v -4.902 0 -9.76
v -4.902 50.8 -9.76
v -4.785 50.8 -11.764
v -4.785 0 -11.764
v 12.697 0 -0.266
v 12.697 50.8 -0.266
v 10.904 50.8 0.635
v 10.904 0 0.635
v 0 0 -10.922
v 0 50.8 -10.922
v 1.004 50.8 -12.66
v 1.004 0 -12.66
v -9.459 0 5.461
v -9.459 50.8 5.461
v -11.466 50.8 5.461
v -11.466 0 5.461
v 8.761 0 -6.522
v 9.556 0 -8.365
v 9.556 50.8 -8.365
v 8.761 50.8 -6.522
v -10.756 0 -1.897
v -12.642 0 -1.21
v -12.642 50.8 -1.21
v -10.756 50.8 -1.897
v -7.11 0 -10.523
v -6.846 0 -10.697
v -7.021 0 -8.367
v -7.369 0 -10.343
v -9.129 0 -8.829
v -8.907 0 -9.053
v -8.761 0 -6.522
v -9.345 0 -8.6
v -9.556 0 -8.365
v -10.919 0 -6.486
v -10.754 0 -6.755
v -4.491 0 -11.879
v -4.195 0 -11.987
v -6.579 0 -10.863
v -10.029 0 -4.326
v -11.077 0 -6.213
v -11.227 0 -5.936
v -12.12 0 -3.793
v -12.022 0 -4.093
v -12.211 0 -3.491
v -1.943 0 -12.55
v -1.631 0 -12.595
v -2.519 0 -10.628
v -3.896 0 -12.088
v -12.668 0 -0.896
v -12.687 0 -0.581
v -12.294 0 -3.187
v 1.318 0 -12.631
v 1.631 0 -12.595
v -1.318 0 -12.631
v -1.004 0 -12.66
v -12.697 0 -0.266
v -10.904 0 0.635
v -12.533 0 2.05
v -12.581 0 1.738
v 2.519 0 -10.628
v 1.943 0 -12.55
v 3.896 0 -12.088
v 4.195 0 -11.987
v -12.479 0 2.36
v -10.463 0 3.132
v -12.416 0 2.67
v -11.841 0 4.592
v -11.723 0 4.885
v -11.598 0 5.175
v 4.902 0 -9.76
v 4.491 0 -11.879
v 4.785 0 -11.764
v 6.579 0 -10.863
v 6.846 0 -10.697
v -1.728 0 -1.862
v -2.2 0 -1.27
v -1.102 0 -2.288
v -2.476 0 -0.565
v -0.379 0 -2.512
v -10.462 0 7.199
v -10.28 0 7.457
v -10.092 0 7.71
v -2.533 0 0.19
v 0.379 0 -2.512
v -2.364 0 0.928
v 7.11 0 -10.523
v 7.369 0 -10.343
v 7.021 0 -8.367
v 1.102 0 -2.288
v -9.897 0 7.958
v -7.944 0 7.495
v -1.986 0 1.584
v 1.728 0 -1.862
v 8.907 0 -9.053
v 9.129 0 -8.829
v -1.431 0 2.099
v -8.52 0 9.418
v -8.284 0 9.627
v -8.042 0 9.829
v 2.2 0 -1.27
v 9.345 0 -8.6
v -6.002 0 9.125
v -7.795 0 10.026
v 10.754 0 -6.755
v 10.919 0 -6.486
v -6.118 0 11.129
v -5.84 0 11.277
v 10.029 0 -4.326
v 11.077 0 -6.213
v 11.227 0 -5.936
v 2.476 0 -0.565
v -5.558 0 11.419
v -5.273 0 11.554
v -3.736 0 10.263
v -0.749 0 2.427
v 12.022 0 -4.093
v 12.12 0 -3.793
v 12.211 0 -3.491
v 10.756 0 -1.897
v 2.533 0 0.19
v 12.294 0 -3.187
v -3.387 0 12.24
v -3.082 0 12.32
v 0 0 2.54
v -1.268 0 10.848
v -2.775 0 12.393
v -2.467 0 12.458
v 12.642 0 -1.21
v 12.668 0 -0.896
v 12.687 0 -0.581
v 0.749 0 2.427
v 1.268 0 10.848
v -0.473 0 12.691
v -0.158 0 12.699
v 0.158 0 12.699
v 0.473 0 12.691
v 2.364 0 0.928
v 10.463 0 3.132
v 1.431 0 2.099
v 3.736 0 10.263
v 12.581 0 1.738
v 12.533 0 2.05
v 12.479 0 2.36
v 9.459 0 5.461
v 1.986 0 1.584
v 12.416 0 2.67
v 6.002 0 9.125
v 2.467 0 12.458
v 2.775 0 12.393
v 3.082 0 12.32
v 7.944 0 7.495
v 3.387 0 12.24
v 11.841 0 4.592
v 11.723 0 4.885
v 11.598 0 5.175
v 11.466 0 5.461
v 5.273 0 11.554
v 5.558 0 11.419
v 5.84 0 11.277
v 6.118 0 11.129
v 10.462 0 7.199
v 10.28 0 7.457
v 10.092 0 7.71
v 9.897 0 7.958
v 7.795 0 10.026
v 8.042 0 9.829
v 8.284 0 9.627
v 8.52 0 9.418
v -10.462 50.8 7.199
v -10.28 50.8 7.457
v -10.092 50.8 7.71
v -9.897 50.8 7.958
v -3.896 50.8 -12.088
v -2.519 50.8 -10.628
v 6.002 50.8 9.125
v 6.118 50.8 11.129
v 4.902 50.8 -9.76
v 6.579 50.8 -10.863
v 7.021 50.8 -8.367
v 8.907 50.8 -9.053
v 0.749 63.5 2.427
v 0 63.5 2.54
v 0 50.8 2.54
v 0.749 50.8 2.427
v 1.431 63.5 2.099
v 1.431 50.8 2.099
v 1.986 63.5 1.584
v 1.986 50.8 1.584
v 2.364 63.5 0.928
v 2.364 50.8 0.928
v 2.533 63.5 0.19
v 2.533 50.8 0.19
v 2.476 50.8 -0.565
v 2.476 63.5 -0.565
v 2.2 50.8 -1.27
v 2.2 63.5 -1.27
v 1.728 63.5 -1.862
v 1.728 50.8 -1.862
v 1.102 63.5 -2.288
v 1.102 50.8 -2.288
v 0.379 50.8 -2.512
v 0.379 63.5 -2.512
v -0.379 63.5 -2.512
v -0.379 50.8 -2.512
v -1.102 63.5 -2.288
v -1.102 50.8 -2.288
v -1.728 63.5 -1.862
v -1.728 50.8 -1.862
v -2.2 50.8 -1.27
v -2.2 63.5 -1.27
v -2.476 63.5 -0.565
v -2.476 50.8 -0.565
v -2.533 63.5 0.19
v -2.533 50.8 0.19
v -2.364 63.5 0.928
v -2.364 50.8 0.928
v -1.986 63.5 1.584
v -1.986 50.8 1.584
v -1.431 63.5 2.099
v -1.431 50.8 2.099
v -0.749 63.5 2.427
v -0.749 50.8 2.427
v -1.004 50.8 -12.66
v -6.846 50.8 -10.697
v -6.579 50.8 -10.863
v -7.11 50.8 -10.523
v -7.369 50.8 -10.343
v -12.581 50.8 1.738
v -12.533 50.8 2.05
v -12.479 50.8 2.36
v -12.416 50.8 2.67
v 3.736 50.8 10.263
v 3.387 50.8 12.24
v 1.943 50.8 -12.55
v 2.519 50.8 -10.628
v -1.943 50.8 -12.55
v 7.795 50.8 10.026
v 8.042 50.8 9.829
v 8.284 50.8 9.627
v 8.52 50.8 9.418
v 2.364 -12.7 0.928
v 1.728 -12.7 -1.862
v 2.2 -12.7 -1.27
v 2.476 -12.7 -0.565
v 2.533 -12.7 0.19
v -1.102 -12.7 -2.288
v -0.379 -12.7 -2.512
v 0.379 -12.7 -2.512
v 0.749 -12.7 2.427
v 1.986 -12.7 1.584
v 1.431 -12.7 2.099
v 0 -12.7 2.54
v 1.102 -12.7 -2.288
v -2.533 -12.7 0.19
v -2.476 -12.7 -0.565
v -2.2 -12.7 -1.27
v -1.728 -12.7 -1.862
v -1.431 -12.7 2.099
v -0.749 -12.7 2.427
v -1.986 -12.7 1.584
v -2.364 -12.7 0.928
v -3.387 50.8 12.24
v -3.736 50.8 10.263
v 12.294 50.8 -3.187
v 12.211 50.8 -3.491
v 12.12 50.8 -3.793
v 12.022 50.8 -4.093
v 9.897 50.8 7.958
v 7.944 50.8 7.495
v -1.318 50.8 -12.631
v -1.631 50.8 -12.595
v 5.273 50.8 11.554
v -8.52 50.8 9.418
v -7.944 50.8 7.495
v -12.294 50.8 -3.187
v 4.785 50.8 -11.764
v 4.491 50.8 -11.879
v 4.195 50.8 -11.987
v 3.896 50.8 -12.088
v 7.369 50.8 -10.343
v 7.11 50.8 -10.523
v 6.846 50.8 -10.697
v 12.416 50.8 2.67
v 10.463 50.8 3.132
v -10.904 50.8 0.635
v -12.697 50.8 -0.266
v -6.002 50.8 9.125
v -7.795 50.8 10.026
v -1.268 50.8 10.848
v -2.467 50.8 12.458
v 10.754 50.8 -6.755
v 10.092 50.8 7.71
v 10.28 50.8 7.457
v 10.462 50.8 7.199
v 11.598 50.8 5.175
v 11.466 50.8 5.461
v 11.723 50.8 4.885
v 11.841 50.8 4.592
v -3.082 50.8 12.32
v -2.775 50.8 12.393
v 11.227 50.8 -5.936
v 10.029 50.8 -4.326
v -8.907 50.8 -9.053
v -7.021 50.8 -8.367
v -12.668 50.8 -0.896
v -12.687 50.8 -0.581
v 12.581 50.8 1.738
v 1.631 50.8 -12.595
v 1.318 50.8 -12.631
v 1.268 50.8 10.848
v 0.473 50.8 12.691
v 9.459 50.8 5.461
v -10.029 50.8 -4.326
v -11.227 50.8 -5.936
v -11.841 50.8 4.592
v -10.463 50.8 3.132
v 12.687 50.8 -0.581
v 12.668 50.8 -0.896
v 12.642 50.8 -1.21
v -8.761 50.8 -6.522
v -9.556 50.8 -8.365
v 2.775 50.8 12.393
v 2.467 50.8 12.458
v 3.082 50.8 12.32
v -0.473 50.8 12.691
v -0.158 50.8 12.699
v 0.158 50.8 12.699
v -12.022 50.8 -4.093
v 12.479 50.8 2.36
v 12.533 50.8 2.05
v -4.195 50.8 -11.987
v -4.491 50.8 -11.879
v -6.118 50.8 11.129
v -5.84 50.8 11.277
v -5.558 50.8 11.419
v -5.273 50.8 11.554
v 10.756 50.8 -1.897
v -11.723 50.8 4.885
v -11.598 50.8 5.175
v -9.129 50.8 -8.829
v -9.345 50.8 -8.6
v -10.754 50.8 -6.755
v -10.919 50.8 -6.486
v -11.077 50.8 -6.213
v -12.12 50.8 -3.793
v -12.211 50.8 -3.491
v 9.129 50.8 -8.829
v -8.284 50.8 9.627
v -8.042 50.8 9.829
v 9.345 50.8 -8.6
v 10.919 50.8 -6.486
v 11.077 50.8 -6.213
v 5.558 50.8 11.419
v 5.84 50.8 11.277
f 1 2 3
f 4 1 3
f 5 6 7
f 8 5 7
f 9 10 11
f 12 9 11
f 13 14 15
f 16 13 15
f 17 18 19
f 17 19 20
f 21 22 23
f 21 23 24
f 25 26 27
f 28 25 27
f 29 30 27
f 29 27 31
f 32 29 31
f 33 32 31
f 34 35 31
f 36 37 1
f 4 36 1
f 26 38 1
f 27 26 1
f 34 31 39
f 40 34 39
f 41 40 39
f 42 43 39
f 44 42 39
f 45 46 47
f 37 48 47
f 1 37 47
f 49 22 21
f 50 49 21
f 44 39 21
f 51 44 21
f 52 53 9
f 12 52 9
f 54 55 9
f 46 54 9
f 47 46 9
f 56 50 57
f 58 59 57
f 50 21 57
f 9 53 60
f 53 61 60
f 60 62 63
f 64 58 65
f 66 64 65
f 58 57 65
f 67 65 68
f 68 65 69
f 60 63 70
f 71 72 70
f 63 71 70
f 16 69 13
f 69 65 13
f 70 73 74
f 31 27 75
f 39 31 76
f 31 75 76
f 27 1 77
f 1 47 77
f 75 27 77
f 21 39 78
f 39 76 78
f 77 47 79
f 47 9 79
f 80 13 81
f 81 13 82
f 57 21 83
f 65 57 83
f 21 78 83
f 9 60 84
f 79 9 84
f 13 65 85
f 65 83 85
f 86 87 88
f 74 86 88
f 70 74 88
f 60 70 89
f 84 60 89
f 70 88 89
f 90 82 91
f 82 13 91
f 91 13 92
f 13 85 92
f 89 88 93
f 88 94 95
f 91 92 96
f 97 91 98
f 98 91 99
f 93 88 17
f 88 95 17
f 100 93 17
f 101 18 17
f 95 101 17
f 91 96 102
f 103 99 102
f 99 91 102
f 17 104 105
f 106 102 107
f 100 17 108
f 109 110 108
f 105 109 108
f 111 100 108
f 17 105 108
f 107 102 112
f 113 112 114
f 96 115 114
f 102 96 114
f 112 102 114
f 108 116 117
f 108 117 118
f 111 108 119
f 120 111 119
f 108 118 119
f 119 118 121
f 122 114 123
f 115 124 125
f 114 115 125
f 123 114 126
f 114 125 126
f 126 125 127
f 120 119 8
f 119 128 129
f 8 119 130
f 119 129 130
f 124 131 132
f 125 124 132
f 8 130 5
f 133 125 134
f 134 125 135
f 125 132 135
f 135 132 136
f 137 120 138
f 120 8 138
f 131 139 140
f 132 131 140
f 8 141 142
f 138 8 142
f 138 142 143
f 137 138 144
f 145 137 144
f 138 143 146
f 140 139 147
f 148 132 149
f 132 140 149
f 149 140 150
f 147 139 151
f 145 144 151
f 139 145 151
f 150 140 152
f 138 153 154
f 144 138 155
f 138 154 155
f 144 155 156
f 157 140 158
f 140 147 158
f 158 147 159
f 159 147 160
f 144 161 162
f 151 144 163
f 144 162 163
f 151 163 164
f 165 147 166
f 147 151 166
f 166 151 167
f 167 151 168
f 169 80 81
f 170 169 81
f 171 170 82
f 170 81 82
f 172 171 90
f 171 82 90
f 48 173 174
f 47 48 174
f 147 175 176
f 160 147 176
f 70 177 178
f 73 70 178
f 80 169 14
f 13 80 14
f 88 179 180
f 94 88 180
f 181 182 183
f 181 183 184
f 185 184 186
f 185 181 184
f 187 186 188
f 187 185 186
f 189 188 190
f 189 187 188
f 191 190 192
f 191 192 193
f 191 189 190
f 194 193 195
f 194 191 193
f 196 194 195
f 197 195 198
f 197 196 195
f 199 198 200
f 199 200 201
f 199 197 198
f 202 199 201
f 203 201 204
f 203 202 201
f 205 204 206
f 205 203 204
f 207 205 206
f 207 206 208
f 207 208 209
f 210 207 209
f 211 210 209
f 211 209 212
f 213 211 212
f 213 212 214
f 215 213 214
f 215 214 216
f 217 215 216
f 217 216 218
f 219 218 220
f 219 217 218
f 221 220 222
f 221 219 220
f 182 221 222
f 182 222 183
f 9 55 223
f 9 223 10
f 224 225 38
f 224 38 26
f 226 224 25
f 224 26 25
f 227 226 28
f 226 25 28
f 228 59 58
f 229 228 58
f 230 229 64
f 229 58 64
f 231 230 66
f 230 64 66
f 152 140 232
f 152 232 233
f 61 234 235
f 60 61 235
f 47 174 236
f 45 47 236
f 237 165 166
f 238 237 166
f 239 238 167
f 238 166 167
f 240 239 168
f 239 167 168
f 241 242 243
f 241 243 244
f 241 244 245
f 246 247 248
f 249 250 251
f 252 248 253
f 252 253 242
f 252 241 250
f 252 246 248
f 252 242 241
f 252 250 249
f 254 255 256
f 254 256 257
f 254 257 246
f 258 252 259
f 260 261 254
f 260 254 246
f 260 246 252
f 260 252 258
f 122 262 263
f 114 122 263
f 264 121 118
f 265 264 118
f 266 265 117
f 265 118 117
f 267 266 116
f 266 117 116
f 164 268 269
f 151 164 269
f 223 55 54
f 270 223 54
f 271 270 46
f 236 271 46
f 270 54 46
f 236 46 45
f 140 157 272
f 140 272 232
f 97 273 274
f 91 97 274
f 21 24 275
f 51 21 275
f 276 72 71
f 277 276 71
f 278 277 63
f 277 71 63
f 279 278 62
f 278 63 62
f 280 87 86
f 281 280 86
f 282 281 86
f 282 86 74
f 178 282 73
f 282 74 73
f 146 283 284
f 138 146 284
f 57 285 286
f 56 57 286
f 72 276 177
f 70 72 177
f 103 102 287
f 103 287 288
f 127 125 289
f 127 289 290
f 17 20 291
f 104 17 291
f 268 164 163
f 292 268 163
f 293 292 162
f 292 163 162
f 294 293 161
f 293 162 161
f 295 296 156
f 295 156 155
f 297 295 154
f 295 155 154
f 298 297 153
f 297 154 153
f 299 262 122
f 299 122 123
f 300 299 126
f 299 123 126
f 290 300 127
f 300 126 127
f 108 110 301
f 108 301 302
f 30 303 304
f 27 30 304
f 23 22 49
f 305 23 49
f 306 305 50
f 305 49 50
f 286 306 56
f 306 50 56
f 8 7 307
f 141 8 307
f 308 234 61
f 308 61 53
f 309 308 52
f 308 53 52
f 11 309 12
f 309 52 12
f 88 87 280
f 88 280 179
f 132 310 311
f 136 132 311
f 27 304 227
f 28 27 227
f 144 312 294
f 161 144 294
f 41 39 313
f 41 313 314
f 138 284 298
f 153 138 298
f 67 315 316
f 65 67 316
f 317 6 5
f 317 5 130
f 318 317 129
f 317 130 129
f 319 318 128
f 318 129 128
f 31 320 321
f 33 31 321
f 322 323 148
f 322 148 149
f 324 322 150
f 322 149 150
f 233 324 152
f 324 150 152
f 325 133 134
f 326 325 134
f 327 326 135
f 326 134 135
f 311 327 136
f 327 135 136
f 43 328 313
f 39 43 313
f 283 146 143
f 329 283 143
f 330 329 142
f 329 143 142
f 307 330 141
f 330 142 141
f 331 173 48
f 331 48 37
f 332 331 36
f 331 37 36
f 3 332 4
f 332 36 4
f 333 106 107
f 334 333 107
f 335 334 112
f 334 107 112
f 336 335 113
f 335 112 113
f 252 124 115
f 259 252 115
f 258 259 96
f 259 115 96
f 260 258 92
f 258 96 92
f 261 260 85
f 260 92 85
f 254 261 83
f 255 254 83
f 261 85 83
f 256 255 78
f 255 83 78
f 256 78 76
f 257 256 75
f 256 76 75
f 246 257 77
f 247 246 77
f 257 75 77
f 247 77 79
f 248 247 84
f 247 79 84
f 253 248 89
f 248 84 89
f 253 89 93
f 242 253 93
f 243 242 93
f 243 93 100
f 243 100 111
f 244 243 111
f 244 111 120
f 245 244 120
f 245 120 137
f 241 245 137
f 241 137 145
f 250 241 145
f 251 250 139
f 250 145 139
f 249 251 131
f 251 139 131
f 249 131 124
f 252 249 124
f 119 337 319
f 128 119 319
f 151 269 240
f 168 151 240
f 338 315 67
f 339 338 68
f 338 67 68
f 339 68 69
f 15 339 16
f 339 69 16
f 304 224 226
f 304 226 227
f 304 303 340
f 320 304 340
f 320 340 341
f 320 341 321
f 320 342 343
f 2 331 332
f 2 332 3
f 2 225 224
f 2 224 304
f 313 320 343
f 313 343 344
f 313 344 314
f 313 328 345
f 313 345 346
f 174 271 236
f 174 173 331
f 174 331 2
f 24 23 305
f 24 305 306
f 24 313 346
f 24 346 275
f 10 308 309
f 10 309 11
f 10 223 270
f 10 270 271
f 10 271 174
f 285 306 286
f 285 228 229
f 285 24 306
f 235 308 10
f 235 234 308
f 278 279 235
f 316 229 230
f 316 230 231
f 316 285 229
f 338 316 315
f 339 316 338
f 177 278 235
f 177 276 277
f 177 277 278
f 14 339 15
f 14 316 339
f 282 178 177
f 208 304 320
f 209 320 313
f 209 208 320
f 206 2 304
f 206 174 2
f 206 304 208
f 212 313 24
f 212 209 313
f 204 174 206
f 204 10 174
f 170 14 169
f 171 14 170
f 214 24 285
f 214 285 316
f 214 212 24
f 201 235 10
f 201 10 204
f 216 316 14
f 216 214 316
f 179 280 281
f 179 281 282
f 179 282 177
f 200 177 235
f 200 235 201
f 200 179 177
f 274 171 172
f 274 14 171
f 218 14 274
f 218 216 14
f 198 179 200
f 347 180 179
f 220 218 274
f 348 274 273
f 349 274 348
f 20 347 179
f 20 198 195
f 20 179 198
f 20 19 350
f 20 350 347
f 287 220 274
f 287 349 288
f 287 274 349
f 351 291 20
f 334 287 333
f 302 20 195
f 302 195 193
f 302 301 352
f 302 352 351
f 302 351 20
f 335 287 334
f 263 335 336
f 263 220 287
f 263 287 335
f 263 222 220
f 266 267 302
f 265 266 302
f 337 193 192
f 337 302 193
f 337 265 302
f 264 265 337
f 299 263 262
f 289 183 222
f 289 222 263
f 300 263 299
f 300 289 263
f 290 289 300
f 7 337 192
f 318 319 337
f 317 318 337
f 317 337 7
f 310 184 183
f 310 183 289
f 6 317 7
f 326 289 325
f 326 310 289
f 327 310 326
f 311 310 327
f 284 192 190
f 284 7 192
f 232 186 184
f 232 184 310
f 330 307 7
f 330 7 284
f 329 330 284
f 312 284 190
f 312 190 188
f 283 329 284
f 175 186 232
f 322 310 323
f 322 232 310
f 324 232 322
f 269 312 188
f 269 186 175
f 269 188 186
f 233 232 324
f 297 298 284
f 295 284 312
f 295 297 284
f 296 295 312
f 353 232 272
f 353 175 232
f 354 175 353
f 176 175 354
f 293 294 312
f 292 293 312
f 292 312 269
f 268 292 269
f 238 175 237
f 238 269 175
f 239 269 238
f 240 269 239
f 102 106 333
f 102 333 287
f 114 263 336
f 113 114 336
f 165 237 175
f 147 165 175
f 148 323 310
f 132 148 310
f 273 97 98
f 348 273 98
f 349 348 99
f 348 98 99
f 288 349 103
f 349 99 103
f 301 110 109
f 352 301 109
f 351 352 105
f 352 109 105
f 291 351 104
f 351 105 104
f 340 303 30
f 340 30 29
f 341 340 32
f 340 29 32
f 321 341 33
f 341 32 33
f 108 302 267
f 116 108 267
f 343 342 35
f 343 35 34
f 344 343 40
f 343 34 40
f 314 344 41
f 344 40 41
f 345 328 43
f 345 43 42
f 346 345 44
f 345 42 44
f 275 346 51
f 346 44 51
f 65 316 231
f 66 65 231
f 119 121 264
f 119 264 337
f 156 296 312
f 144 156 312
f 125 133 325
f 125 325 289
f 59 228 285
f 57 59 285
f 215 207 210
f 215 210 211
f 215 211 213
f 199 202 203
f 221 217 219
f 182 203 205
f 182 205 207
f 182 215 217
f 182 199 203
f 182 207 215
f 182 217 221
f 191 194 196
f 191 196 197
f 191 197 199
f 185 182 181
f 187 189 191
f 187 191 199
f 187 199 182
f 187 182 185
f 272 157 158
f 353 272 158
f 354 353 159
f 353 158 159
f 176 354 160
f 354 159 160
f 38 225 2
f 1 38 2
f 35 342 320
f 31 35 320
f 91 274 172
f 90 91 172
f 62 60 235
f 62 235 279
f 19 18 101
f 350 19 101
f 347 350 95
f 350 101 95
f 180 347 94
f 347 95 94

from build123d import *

# Parameters (mm, degrees)
SKETCH1_R           = 12.7
BOSS_EXTRUDE2_DEPTH = 50.8
CUT_EXTRUDE1_DEPTH  = 50.8
SKETCH3_R           = 2.54
BOSS_EXTRUDE3_DEPTH = 12.7
BOSS_EXTRUDE4_START = 12.7
SKETCH4_R           = 2.54
BOSS_EXTRUDE4_DEPTH = 12.7


with BuildPart() as part:
    # Sketch1 → Boss-Extrude2 (new body)
    with BuildSketch(Plane(origin=(0, 0, 0), x_dir=(1, 0, 0), z_dir=(0, 1, 0))):
        with Locations(Location((0, 0, 0), (0, 0, 270))):
            Circle(SKETCH1_R)
    extrude(amount=BOSS_EXTRUDE2_DEPTH)

    # Sketch2 → Cut-Extrude1 (cut)
    with BuildSketch(Plane(origin=(0, 50.8, 0), x_dir=(1, 0, 0), z_dir=(0, 1, 0))):
        Polygon((2.51878654, 10.627596076), (4.632126911, 12.867606004), (1.635551224, 13.577807488), align=None)
        Polygon((0, 10.922), (1.539793168, 13.589), (-1.539793168, 13.589), align=None)
        Polygon((4.901784646, 9.760255698), (7.474741494, 11.452516038), (4.722722626, 12.834631861), align=None)
        Polygon((7.020526273, 8.366737408), (9.914390828, 9.420017968), (7.555290828, 11.399537907), align=None)
        Polygon((8.760789511, 6.522166139), (11.819552786, 6.879684291), (9.980551347, 9.349891915), align=None)
        Polygon((10.028756319, 4.325983205), (13.087519594, 3.968465053), (11.867757759, 6.796190829), align=None)
        Polygon((10.756070278, 1.896585396), (13.649934833, 0.843304837), (13.115170278, 3.876105336), align=None)
        Polygon((10.903521705, -0.635057821), (13.476478552, -2.327318162), (13.655540573, 0.747058002), align=None)
        Polygon((10.463161454, -3.132464908), (12.576501825, -5.372474835), (13.459737141, -2.422263423), align=None)
        Polygon((9.45872946, -5.461), (10.998522628, -8.128), (12.538315796, -5.461), align=None)
        Polygon((7.944374913, -7.495131169), (8.82761023, -10.445342581), (10.940950601, -8.205332653), align=None)
        Polygon((6.001737058, -9.125197876), (6.180799079, -12.199574039), (8.753755927, -10.507313699), align=None)
        Polygon((3.735544005, -10.263322804), (3.20077945, -13.296123304), (6.094644005, -12.242842744), align=None)
        Polygon((1.267966808, -10.848149343), (0.048204973, -13.675875119), (3.106968247, -13.318356967), align=None)
        Polygon((-1.267966808, -10.848149343), (-3.106968247, -13.318356967), (-0.048204973, -13.675875119), align=None)
        Polygon((-3.735544005, -10.263322804), (-6.094644005, -12.242842744), (-3.20077945, -13.296123304), align=None)
        Polygon((-6.001737058, -9.125197876), (-8.753755927, -10.507313699), (-6.180799079, -12.199574039), align=None)
        Polygon((-7.944374913, -7.495131169), (-10.940950601, -8.205332653), (-8.82761023, -10.445342581), align=None)
        Polygon((-9.45872946, -5.461), (-12.538315796, -5.461), (-10.998522628, -8.128), align=None)
        Polygon((-10.463161454, -3.132464908), (-13.459737141, -2.422263423), (-12.576501825, -5.372474835), align=None)
        Polygon((-10.903521705, -0.635057821), (-13.655540573, 0.747058002), (-13.476478552, -2.327318162), align=None)
        Polygon((-10.756070278, 1.896585396), (-13.115170278, 3.876105336), (-13.649934833, 0.843304837), align=None)
        Polygon((-10.028756319, 4.325983205), (-11.867757759, 6.796190829), (-13.087519594, 3.968465053), align=None)
        Polygon((-8.760789511, 6.522166139), (-9.980551347, 9.349891915), (-11.819552786, 6.879684291), align=None)
        Polygon((-7.020526273, 8.366737408), (-7.555290828, 11.399537907), (-9.914390828, 9.420017968), align=None)
        Polygon((-4.901784646, 9.760255698), (-4.722722626, 12.834631861), (-7.474741494, 11.452516038), align=None)
        Polygon((-2.51878654, 10.627596076), (-1.635551224, 13.577807488), (-4.632126911, 12.867606004), align=None)
    extrude(amount=-CUT_EXTRUDE1_DEPTH, mode=Mode.SUBTRACT)

    # Sketch3 → Boss-Extrude3 (add)
    with BuildSketch(Plane(origin=(0, 0, 0), x_dir=(-1, 0, 0), z_dir=(0, -1, 0))):
        with Locations(Location((0, 0, 0), (0, 0, 270))):
            Circle(SKETCH3_R)
    extrude(amount=BOSS_EXTRUDE3_DEPTH)

    # Sketch4 → Boss-Extrude4 (add)
    with BuildSketch(Plane(origin=(0, 50.8, 0), x_dir=(1, 0, 0), z_dir=(0, 1, 0)).offset(BOSS_EXTRUDE4_START)):
        with Locations(Location((0, 0, 0), (0, 0, 270))):
            Circle(SKETCH4_R)
    extrude(amount=-BOSS_EXTRUDE4_DEPTH)


solid = part.part
